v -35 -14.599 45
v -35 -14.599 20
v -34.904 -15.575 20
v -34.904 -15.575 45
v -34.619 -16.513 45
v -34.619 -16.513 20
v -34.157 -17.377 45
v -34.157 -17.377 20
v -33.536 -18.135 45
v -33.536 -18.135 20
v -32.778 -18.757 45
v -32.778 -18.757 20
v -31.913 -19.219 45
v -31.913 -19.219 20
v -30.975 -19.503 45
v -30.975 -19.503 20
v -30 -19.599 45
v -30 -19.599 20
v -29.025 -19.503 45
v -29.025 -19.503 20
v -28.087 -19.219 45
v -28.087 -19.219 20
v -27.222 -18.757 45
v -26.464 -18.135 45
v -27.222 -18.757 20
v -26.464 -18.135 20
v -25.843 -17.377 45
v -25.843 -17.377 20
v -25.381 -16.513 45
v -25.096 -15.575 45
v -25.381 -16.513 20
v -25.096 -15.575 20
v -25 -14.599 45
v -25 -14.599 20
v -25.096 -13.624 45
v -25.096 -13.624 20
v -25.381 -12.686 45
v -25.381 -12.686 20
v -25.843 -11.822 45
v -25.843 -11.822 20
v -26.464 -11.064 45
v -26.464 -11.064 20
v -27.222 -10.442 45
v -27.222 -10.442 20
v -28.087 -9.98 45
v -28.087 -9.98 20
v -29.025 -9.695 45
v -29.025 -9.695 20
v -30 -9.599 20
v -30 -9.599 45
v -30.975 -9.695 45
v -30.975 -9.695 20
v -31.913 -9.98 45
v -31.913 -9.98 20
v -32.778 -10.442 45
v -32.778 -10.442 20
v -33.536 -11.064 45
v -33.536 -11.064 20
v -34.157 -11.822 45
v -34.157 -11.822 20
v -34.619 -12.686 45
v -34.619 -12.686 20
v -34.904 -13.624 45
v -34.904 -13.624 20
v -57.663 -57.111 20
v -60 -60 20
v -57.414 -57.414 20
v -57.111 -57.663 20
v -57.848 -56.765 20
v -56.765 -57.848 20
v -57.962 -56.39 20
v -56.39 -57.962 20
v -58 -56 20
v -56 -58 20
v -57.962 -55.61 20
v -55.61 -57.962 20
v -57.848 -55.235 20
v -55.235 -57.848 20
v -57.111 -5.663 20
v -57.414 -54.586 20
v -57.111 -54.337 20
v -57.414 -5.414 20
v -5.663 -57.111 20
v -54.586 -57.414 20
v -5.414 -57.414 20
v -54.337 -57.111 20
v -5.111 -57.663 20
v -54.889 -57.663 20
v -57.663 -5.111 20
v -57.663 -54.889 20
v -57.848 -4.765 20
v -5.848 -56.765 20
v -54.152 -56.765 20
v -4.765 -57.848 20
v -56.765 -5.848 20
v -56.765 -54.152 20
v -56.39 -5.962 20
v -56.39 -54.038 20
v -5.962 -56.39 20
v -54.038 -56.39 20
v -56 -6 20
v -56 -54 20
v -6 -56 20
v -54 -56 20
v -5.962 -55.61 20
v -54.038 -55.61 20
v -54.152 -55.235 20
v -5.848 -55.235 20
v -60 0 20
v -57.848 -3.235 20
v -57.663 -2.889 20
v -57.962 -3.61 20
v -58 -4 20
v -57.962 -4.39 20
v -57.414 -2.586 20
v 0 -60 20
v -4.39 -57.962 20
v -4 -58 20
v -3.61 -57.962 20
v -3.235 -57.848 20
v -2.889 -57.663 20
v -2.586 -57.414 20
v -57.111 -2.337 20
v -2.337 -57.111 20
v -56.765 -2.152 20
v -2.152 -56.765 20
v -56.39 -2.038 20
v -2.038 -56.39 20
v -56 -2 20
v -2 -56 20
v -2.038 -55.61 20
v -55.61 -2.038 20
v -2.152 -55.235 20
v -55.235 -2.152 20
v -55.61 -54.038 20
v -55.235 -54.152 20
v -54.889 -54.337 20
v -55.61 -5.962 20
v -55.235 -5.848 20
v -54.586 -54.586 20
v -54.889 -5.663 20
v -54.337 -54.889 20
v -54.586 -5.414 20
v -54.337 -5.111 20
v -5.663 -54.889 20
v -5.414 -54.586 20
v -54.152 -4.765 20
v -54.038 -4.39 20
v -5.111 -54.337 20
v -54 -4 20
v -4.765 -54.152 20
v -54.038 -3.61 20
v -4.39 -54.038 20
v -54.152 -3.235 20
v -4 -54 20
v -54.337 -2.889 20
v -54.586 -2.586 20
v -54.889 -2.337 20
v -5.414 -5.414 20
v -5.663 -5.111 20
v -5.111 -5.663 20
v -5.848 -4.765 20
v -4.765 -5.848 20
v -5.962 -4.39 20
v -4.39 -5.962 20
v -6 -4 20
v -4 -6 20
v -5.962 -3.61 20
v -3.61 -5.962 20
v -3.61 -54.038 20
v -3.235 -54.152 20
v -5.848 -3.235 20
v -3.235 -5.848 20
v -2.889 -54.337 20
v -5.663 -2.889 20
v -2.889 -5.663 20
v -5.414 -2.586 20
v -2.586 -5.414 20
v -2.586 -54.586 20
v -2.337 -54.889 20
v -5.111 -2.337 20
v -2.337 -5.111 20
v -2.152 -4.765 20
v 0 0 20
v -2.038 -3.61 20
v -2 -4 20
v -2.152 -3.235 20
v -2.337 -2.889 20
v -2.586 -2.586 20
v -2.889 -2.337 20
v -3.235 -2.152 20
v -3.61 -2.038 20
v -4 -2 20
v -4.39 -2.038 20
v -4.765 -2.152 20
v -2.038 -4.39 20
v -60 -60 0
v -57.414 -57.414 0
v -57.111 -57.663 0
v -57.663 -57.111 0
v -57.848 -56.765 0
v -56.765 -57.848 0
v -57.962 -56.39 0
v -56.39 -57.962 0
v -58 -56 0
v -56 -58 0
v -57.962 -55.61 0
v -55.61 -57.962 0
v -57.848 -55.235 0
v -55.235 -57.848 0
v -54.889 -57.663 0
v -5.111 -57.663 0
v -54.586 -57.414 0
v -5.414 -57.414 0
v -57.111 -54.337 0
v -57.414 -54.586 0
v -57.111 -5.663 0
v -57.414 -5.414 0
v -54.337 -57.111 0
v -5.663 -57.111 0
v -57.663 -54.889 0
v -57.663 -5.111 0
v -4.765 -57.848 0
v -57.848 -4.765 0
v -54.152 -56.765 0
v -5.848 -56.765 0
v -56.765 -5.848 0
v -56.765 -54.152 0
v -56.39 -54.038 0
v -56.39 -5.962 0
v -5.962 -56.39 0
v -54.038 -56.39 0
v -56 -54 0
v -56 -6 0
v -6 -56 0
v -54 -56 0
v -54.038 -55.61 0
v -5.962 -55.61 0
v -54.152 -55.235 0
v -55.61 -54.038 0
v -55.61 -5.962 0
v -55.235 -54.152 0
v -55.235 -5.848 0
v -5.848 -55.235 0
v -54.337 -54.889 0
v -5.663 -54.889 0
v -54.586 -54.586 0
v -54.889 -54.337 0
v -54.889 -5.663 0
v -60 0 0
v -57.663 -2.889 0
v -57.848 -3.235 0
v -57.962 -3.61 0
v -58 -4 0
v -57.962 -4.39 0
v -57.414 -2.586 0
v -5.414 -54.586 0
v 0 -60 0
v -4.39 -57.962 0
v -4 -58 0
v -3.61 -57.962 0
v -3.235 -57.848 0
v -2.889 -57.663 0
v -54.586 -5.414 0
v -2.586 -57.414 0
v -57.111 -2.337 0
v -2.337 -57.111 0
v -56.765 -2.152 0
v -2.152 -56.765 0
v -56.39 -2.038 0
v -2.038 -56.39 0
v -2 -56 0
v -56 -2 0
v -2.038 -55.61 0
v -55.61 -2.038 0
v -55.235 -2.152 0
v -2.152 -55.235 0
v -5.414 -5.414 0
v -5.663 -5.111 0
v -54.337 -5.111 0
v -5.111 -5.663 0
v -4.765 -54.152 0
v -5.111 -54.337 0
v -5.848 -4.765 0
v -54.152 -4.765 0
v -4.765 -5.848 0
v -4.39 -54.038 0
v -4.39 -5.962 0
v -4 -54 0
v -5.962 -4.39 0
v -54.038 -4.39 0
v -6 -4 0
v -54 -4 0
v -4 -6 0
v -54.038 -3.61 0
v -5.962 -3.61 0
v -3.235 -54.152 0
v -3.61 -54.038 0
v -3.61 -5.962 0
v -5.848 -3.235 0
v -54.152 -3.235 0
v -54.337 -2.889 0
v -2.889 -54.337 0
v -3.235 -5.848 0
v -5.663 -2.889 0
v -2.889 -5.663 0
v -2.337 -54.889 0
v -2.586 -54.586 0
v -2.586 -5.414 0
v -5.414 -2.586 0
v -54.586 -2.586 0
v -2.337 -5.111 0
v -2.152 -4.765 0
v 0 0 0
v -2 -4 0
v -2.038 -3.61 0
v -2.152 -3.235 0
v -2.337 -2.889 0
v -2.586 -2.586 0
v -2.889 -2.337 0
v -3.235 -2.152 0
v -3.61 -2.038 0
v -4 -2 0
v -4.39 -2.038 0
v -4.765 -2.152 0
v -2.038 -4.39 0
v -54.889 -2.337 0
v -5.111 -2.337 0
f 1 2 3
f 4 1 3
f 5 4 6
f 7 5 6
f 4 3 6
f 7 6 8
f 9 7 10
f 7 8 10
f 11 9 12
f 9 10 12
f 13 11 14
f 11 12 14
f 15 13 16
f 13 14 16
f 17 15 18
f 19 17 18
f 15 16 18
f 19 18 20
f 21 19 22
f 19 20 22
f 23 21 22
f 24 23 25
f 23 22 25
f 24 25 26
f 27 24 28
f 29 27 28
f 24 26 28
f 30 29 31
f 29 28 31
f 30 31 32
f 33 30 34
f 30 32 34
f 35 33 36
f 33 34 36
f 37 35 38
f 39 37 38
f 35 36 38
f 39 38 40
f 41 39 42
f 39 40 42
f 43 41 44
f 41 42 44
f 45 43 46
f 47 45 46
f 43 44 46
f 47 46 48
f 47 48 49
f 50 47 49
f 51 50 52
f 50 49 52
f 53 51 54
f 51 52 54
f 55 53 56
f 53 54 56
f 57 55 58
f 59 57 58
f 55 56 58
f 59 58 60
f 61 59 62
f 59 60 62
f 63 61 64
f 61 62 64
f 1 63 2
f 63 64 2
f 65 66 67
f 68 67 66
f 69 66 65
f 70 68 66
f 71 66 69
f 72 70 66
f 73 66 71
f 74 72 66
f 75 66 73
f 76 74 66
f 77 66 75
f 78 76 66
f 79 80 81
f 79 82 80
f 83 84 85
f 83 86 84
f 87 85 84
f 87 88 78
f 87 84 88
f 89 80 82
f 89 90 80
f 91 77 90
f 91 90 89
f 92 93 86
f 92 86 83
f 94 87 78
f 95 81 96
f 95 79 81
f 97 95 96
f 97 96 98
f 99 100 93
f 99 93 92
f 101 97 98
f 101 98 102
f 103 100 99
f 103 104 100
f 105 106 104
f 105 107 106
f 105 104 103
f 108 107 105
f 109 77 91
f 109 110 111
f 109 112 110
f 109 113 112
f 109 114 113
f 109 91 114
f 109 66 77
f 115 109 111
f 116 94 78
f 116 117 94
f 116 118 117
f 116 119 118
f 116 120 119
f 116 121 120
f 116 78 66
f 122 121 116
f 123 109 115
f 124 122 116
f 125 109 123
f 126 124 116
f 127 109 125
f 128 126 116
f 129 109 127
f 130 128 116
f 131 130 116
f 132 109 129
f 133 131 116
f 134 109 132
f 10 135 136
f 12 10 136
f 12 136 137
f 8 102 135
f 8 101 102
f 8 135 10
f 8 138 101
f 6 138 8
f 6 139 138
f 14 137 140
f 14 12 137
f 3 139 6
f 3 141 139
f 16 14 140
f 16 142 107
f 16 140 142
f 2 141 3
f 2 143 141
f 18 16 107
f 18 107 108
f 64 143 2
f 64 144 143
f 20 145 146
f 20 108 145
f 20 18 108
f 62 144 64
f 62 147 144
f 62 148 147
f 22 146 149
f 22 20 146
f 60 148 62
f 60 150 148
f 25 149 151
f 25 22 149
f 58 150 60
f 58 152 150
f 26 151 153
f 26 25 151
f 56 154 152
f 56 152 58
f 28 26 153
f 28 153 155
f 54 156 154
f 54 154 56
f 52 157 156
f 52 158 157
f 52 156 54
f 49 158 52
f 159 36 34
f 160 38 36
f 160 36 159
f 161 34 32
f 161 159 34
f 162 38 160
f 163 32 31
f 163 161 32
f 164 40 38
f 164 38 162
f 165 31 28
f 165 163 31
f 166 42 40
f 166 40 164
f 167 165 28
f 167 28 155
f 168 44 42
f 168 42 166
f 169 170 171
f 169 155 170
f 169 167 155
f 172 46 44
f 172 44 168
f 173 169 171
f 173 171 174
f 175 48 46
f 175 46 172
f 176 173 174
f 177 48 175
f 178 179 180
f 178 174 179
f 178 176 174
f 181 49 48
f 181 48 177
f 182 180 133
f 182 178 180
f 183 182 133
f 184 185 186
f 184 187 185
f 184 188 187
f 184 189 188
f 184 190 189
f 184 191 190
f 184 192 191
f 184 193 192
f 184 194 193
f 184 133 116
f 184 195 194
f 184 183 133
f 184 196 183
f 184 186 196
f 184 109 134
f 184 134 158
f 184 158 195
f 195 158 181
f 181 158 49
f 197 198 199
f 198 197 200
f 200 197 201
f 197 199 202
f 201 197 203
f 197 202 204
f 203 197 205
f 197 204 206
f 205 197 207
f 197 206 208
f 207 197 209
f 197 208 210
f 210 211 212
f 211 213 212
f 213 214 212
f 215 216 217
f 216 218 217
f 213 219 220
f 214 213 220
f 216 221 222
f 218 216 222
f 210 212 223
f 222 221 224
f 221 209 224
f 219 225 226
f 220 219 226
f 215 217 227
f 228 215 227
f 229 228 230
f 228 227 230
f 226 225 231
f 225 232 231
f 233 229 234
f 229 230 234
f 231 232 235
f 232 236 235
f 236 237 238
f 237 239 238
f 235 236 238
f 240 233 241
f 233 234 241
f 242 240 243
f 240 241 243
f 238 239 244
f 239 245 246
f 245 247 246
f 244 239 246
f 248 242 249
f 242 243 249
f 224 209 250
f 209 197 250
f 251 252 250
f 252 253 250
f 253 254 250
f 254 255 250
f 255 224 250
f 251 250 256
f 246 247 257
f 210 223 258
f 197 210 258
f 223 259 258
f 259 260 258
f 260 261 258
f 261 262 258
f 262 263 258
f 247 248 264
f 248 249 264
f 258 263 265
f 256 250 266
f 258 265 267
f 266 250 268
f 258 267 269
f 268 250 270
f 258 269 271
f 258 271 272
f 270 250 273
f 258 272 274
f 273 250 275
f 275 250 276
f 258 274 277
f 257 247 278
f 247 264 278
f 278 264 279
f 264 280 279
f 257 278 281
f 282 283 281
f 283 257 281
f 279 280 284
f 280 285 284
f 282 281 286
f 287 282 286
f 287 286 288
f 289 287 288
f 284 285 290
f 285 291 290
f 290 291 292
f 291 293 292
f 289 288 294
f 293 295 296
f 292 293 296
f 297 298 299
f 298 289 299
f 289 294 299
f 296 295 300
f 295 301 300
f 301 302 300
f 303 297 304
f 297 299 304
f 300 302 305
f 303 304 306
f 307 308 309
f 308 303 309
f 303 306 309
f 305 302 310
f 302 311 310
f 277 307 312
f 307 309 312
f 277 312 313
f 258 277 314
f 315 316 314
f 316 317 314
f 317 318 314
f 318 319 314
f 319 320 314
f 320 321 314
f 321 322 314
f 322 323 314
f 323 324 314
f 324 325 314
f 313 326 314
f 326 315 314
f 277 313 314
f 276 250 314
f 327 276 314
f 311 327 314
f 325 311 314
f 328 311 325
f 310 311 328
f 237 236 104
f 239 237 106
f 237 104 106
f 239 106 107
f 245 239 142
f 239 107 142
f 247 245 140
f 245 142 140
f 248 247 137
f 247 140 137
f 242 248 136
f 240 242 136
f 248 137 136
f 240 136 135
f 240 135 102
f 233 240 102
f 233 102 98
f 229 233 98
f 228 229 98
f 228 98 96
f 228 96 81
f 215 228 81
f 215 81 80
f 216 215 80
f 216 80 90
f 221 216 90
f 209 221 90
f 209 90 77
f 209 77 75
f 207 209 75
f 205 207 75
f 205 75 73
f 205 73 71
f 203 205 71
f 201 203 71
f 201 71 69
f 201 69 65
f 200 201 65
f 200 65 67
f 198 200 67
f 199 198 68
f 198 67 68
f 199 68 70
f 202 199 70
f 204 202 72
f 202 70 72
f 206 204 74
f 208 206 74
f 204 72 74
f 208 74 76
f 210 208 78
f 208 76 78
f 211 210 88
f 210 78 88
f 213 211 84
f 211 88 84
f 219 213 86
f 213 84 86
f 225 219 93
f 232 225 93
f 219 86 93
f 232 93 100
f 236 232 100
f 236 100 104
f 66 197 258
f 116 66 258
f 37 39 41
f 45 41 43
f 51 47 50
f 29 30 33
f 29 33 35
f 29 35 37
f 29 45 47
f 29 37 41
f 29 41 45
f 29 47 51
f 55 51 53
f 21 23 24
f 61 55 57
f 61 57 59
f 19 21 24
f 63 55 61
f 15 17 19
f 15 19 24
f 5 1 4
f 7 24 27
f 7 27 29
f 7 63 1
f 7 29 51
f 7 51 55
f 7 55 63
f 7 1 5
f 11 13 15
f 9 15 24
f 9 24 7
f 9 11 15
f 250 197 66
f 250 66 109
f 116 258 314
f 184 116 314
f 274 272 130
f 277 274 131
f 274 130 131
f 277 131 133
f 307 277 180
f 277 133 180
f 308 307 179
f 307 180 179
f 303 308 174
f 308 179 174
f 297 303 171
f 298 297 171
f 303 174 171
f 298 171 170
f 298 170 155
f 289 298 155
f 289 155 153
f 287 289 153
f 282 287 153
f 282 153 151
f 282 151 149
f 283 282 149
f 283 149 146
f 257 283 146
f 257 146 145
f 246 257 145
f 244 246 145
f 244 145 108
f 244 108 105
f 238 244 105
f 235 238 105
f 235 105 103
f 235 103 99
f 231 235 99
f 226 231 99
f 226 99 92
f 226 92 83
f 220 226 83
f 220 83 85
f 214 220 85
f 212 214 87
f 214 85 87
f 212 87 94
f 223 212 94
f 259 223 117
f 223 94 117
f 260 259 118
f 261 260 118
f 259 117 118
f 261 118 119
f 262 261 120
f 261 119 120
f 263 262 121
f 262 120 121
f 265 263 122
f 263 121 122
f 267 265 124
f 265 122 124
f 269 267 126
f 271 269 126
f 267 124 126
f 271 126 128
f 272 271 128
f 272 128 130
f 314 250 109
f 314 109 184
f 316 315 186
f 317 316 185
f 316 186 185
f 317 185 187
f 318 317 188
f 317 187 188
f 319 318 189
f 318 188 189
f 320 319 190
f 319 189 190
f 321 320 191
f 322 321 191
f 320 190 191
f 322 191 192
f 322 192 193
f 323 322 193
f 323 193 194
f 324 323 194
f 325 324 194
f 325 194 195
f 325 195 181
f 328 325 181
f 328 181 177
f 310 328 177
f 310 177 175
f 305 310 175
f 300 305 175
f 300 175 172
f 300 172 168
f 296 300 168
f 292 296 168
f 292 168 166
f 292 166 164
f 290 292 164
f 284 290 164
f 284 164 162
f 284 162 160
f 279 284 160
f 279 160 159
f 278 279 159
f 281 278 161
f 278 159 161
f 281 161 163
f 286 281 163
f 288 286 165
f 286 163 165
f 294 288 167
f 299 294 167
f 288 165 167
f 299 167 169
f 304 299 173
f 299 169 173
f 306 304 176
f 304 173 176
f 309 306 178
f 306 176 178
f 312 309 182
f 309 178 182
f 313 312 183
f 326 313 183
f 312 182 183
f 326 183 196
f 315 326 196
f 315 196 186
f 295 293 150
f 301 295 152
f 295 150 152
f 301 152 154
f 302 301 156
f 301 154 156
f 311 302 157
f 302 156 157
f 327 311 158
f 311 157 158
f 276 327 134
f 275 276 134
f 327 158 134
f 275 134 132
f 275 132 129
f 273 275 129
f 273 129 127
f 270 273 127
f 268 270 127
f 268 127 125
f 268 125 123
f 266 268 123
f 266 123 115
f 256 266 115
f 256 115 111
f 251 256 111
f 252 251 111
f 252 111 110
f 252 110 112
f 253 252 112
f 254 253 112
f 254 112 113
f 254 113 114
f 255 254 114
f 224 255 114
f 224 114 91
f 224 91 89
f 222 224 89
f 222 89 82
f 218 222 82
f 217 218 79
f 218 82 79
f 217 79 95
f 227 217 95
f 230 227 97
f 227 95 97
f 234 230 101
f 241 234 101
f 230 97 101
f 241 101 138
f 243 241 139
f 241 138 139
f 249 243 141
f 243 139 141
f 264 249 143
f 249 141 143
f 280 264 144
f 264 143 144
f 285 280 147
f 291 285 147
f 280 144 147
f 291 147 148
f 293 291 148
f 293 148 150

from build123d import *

# Parameters (mm, degrees)
SKETCH1_W           = 60
SKETCH1_H           = 60
BOSS_EXTRUDE1_DEPTH = 20
SKETCH2_R           = 5
BOSS_EXTRUDE2_DEPTH = 25
SKETCH2_3_R         = 2
CUT_EXTRUDE1_DEPTH  = 89.459030065


with BuildPart() as part:
    # Sketch1 → Boss-Extrude1 (new body)
    with BuildSketch(Plane.XY):
        with Locations((-30, -30)):
            Rectangle(SKETCH1_W, SKETCH1_H)
    extrude(amount=BOSS_EXTRUDE1_DEPTH)

    # Sketch2 → Boss-Extrude2 (add)
    with BuildSketch(Plane.XY.offset(20)):
        with Locations((-30, -14.599362292)):
            Circle(SKETCH2_R)
    extrude(amount=BOSS_EXTRUDE2_DEPTH)

    # Sketch2<3> → Cut-Extrude1 (cut, through all)
    with BuildSketch(Plane.XY.offset(20)):
        with Locations((-56, -4)):
            Circle(SKETCH2_3_R)
        with Locations((-4, -4)):
            Circle(SKETCH2_3_R)
        with Locations((-4, -56)):
            Circle(SKETCH2_3_R)
        with Locations((-56, -56)):
            Circle(SKETCH2_3_R)
    extrude(amount=-CUT_EXTRUDE1_DEPTH, mode=Mode.SUBTRACT)


solid = part.part
